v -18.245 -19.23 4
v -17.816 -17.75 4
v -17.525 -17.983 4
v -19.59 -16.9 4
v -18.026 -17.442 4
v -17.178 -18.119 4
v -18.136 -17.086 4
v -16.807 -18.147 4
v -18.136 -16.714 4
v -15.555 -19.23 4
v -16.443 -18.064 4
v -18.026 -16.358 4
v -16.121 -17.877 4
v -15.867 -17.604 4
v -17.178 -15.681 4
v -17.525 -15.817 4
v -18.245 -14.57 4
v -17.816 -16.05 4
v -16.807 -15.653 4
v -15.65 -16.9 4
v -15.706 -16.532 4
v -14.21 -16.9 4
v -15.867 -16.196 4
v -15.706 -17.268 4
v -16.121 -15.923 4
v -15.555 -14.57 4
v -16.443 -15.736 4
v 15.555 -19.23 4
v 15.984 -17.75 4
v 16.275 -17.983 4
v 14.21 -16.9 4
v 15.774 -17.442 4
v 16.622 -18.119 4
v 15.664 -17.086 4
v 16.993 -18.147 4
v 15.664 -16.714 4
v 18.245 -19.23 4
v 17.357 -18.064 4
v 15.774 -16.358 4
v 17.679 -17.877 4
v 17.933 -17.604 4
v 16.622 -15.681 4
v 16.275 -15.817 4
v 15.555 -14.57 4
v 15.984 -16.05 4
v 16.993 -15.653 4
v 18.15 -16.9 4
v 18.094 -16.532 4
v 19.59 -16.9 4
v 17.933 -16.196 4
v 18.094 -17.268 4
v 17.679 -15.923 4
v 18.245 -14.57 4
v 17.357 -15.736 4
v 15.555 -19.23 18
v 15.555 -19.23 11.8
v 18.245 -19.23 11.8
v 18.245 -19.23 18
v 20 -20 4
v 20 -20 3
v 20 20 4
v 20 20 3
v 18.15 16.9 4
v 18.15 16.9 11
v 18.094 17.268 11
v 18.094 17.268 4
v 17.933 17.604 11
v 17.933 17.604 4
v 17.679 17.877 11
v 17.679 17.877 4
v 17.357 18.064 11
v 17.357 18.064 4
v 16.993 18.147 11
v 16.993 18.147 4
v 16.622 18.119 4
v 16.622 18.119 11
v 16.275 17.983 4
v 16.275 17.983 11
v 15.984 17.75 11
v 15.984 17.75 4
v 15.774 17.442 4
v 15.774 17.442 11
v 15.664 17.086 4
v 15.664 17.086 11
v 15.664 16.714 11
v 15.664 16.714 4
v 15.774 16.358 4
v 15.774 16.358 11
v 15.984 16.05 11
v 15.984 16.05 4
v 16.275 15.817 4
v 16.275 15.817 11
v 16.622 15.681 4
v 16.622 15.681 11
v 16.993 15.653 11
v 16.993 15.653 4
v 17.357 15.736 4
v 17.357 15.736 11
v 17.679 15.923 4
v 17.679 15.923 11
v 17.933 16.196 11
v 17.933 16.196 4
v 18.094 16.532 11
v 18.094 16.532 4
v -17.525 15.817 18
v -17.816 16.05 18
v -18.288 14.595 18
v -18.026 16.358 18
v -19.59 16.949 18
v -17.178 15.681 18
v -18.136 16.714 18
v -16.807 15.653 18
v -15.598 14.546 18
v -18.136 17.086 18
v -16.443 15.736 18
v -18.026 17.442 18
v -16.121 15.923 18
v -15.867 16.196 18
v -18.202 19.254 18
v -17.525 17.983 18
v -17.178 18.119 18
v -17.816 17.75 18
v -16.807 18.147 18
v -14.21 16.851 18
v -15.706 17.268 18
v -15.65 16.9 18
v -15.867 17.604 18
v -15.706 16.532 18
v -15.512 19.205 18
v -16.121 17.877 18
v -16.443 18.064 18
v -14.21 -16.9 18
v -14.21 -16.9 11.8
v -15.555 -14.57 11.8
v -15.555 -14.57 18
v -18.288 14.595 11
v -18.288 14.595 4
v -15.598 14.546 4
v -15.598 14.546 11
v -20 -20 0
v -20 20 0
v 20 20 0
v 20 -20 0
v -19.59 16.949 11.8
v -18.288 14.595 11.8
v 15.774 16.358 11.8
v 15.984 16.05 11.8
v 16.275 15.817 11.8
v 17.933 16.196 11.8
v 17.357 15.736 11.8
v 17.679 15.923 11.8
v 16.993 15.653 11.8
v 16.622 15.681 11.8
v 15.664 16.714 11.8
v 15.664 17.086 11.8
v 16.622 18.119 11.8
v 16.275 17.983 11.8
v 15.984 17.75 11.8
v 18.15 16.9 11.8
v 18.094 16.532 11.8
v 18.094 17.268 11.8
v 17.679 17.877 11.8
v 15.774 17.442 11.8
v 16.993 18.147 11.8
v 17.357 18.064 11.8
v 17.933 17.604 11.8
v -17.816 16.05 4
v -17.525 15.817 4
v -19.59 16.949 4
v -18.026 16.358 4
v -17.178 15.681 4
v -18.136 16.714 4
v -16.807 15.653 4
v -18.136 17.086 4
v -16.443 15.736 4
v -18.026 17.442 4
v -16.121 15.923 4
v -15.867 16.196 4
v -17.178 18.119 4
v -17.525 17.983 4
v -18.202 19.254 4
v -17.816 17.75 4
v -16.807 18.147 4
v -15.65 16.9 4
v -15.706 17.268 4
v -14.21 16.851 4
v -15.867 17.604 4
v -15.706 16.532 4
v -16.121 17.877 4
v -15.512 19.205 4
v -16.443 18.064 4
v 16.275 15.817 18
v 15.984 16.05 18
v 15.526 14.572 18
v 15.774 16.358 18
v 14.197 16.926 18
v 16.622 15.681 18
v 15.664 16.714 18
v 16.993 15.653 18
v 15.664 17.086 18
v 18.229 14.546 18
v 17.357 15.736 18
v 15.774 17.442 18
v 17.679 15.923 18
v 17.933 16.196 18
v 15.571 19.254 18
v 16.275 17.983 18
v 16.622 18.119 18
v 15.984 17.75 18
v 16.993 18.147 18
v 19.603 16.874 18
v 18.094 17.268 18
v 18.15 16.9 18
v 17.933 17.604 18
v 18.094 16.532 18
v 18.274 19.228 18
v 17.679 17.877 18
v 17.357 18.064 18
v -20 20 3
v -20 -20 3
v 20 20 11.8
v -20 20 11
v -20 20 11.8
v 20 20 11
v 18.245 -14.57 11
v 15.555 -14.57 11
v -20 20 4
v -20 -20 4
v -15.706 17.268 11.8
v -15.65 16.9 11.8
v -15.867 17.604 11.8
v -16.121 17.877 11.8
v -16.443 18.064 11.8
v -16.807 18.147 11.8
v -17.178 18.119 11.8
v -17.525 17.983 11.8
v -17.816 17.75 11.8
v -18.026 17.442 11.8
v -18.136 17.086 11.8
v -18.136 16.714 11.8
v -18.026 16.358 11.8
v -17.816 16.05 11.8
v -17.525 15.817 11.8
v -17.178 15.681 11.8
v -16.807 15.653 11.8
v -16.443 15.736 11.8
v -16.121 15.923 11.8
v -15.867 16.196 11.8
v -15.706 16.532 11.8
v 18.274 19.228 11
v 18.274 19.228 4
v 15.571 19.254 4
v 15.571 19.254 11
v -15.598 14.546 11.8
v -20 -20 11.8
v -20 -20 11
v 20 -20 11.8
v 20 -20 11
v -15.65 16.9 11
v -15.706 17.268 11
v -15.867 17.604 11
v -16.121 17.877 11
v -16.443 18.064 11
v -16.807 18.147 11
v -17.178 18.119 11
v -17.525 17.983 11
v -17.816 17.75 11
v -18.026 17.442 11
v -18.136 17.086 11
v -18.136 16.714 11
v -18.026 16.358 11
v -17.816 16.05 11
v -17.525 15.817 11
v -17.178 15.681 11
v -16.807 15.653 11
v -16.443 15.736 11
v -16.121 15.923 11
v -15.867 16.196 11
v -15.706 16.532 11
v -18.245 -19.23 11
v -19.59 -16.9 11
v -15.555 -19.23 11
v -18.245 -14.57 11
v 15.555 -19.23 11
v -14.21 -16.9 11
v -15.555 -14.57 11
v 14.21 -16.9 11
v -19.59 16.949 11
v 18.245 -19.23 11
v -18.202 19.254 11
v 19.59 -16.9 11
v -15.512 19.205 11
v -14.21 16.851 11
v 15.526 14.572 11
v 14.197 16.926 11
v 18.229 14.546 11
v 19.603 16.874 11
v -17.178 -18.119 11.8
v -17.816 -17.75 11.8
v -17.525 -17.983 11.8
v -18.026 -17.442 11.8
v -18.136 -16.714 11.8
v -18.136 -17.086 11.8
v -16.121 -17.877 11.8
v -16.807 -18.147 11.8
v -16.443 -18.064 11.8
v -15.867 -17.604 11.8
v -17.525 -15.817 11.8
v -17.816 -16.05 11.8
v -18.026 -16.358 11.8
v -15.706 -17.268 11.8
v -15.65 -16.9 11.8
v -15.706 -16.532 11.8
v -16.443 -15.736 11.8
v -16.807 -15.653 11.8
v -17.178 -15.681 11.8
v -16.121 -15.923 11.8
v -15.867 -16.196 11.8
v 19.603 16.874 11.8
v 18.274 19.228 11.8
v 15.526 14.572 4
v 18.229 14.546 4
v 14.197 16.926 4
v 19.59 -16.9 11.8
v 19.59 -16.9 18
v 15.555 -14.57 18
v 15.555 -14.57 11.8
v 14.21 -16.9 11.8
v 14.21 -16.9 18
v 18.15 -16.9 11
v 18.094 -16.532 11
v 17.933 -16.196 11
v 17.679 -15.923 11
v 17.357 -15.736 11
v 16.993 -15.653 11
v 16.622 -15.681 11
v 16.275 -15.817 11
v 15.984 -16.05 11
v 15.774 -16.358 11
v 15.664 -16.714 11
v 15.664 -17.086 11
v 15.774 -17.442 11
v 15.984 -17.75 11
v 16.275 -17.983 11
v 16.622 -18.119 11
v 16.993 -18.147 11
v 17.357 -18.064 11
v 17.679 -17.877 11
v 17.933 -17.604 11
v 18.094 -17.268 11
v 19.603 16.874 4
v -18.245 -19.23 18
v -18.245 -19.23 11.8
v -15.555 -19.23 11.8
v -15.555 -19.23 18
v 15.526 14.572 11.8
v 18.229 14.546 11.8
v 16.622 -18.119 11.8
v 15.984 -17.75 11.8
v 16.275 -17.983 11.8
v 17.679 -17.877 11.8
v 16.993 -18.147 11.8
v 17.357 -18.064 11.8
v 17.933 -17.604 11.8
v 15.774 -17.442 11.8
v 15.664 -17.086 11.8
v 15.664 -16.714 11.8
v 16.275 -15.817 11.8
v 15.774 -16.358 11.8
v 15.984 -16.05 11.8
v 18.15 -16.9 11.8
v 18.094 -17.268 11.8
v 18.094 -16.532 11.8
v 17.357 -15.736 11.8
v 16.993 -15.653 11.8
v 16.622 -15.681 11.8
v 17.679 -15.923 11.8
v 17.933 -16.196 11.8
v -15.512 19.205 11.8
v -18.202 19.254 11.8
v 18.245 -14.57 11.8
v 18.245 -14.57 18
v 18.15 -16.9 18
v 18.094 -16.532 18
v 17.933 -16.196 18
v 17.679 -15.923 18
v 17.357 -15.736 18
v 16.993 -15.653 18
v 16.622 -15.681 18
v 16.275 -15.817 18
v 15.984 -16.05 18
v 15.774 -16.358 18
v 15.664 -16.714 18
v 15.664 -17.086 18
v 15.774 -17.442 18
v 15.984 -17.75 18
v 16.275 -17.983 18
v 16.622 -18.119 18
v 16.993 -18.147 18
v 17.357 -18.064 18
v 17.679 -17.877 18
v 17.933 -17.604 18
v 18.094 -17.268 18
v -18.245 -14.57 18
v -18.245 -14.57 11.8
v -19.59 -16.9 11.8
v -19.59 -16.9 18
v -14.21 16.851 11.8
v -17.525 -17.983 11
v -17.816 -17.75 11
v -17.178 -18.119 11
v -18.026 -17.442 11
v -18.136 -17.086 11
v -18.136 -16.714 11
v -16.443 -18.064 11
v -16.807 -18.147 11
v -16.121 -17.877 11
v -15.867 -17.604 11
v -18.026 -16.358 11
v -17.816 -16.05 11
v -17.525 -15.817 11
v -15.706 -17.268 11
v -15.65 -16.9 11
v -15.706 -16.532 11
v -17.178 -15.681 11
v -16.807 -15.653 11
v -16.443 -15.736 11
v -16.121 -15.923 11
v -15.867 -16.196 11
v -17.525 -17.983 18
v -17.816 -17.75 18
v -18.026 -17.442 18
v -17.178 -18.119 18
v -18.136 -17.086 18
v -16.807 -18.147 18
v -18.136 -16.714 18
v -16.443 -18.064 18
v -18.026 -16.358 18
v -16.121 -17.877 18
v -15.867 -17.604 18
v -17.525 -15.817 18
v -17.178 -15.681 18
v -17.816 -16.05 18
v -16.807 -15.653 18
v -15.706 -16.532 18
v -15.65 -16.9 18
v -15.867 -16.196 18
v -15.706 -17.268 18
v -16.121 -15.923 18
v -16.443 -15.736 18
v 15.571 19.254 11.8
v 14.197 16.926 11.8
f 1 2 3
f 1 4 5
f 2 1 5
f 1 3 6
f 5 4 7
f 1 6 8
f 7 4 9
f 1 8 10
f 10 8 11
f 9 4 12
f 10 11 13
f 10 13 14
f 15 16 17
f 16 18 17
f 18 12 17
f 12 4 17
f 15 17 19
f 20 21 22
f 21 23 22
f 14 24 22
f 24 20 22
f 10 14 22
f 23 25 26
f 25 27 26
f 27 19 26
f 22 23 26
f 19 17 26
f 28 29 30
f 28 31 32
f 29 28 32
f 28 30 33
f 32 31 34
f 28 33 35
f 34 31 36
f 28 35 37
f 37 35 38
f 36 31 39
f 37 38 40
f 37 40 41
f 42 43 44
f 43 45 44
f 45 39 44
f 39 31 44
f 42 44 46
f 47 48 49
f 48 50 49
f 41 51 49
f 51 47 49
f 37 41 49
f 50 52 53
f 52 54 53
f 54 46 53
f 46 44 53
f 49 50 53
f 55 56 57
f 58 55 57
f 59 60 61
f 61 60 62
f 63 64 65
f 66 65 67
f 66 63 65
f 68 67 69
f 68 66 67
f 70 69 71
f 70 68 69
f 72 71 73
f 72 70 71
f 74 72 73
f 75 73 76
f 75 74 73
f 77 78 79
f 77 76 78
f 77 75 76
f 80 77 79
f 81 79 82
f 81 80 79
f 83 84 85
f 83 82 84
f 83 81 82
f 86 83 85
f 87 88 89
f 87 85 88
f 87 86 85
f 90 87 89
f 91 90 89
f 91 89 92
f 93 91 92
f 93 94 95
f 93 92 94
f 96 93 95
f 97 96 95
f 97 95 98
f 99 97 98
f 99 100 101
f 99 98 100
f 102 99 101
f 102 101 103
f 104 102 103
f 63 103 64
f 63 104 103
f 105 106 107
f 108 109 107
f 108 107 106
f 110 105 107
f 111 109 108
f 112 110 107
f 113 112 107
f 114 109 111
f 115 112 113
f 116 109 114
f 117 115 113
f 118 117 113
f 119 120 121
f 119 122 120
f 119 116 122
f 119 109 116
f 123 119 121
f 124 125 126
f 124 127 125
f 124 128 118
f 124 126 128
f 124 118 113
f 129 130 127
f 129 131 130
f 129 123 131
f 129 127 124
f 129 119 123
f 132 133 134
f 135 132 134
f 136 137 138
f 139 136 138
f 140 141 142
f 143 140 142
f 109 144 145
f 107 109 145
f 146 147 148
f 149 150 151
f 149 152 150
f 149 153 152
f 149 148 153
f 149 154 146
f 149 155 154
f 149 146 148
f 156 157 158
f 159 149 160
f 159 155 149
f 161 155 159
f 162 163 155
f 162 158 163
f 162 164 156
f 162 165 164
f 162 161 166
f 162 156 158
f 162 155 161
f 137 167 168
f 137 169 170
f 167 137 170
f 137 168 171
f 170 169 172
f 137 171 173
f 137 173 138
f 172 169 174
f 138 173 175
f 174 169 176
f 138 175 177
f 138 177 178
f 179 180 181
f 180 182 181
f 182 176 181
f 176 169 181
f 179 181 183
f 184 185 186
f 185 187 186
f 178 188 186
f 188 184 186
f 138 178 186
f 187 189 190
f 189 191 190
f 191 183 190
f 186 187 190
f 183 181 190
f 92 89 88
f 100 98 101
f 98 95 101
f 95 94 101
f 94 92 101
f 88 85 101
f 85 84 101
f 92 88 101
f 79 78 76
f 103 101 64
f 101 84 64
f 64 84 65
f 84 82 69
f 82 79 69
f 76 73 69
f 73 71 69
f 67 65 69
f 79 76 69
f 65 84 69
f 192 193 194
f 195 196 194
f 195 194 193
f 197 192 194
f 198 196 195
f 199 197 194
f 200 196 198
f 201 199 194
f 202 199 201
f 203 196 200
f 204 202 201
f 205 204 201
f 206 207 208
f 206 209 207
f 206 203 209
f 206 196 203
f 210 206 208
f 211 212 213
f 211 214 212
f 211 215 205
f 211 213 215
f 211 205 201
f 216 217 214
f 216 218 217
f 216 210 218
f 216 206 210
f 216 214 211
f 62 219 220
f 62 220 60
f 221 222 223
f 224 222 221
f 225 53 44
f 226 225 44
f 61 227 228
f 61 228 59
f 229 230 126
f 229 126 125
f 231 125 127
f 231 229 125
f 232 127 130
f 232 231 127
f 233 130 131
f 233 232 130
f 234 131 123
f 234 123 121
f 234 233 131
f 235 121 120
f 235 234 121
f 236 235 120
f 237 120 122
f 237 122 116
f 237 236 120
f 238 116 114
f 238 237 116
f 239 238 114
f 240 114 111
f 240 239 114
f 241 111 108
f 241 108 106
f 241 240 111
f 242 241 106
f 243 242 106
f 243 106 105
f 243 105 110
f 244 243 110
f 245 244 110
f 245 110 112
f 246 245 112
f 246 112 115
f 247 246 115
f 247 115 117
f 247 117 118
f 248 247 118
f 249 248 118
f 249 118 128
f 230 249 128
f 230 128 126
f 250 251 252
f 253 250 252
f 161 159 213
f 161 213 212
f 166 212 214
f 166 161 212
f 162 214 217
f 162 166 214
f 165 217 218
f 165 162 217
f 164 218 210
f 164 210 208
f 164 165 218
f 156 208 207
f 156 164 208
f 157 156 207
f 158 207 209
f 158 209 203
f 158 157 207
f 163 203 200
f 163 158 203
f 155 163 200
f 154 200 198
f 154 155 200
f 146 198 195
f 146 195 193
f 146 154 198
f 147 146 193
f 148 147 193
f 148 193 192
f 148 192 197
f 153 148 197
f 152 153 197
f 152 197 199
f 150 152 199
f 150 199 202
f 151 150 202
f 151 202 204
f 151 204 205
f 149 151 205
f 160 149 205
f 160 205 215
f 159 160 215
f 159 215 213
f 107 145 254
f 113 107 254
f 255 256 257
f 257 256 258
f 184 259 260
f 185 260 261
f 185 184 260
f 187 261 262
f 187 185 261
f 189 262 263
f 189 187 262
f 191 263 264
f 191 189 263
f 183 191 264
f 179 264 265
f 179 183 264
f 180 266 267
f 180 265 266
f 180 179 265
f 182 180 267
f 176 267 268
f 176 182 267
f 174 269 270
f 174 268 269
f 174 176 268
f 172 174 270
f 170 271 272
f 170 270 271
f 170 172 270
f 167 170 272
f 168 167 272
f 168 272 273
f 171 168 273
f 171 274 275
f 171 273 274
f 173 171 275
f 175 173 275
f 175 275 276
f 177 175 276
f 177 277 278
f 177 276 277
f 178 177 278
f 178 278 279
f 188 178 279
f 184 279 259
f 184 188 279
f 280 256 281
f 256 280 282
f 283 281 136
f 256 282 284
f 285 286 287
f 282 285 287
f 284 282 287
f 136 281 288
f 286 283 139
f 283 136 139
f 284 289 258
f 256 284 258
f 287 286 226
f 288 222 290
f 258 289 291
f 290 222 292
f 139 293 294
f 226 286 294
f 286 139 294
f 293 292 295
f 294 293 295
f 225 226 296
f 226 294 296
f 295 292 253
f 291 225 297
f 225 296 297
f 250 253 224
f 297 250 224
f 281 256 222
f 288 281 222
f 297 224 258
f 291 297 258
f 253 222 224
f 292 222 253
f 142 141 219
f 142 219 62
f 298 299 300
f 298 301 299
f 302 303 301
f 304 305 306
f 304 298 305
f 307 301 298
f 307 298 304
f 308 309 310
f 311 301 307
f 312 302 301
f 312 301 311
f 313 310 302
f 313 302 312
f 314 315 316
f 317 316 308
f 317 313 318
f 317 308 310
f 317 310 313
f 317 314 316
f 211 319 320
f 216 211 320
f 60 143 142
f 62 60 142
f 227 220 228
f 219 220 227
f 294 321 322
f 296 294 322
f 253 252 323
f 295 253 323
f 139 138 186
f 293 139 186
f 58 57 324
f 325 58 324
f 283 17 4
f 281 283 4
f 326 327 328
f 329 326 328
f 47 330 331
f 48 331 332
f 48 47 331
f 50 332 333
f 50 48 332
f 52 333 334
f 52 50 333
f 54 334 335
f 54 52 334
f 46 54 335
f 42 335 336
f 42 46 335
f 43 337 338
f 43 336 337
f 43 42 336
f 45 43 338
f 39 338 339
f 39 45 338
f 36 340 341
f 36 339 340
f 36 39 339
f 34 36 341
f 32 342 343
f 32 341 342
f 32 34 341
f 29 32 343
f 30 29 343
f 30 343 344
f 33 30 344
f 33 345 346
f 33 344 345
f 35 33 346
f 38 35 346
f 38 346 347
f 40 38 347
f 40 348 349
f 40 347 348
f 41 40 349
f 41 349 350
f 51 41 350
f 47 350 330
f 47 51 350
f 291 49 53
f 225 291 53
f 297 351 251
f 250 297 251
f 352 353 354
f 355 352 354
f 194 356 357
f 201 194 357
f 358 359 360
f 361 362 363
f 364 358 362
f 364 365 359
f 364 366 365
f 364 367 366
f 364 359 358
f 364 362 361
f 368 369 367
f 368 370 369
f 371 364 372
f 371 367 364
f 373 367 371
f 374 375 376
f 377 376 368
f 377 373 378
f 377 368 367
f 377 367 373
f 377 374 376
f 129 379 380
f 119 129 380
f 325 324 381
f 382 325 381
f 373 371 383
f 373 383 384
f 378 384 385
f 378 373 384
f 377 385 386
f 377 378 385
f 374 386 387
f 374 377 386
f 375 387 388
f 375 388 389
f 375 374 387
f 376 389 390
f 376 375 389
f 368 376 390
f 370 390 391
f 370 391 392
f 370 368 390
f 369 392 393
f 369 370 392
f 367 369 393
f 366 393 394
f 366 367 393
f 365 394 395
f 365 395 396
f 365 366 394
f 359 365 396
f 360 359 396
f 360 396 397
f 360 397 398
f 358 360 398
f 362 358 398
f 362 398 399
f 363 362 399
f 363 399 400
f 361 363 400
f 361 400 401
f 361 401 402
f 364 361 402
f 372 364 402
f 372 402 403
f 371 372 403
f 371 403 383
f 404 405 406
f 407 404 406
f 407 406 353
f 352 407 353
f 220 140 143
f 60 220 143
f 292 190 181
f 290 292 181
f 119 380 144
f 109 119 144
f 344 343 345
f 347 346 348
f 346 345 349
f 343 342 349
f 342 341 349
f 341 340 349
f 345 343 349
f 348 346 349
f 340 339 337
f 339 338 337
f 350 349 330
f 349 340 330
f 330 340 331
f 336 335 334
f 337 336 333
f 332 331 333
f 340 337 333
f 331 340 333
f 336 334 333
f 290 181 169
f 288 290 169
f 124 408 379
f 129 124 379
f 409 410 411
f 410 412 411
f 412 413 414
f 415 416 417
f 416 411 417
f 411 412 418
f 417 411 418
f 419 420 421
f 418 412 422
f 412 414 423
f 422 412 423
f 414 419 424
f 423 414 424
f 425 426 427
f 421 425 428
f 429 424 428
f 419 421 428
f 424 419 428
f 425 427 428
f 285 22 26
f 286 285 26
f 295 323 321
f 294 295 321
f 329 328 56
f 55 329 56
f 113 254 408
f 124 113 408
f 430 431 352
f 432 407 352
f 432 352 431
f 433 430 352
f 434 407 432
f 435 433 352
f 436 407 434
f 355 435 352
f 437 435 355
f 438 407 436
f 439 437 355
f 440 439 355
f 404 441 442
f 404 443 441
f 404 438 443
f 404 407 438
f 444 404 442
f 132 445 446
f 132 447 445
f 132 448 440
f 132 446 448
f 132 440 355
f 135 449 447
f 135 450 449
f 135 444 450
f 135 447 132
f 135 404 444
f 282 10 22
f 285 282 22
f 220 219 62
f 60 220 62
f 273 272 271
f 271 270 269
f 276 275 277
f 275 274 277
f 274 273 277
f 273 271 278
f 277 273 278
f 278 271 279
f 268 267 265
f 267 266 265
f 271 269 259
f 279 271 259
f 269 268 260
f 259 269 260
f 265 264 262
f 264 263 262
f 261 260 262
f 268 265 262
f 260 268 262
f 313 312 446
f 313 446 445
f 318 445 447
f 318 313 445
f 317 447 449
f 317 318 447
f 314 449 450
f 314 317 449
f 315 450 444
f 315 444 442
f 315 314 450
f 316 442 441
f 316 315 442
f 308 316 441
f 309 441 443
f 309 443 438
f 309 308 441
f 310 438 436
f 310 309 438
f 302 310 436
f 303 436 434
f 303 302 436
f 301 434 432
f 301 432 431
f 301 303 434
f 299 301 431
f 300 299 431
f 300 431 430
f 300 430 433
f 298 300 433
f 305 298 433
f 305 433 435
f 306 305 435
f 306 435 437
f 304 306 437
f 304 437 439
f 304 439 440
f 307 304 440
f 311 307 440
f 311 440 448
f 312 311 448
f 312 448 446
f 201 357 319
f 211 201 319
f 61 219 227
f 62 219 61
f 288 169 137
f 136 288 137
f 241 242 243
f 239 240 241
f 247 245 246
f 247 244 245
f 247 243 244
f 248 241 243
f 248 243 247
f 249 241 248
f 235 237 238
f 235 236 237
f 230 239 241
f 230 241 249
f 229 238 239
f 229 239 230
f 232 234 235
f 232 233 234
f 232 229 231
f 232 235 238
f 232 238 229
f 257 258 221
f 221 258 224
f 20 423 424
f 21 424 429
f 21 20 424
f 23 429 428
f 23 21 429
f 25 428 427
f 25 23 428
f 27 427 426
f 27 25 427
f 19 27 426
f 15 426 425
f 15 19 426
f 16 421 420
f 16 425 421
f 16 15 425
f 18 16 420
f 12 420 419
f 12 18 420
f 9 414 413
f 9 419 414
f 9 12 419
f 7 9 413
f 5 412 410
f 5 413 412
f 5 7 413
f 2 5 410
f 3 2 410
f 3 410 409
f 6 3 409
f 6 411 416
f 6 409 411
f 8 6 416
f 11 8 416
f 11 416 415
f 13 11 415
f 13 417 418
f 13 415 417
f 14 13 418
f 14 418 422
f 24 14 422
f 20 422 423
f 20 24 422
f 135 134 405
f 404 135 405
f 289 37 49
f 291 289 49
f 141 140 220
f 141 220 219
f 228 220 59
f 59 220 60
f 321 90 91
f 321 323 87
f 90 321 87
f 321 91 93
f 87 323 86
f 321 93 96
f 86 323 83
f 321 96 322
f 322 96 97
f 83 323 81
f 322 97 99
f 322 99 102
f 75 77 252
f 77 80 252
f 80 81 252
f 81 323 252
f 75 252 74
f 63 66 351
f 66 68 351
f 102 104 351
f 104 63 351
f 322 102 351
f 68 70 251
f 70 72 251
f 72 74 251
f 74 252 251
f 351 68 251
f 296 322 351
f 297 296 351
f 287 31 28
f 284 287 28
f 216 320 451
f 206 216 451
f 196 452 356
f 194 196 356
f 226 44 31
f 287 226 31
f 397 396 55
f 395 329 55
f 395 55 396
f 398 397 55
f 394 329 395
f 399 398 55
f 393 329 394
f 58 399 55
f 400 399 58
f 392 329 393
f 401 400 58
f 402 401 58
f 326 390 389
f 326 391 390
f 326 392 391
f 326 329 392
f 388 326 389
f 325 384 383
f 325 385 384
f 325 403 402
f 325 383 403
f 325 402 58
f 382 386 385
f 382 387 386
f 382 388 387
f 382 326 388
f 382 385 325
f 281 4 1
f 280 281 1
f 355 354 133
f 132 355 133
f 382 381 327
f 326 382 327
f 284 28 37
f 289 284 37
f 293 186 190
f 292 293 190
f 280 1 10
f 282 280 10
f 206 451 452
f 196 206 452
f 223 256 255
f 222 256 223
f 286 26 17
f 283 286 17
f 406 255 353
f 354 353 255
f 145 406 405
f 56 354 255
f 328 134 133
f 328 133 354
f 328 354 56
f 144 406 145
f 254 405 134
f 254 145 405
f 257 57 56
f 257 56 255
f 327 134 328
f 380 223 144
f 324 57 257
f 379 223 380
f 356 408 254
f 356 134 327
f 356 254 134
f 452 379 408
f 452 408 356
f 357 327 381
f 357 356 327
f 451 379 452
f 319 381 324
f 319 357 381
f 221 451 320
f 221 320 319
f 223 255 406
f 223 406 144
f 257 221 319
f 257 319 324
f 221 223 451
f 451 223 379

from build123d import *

# Parameters (mm, degrees)
SKETCH1_W             = 40
SKETCH1_H             = 40
BOSS_EXTRUDE1_DEPTH   = 3
SKETCH2_W             = 40
SKETCH2_H             = 40
BOSS_EXTRUDE2_DEPTH   = 1
SKETCH3_R             = 1.25
BOSS_EXTRUDE3_DEPTH   = 14
BOSS_EXTRUDE3_2_DEPTH = 14
BOSS_EXTRUDE3_3_DEPTH = 14
BOSS_EXTRUDE3_4_DEPTH = 14
SKETCH4_W             = 40
SKETCH4_H             = 40
BOSS_EXTRUDE4_DEPTH   = 0.8


with BuildPart() as part:
    # Sketch1 → Boss-Extrude1 (new body)
    with BuildSketch(Plane.XY):
        Rectangle(SKETCH1_W, SKETCH1_H)
    extrude(amount=BOSS_EXTRUDE1_DEPTH)


with BuildPart() as body_2:
    # Sketch2 → Boss-Extrude2 (new body)
    with BuildSketch(Plane.XY.offset(3)):
        Rectangle(SKETCH2_W, SKETCH2_H)
    extrude(amount=BOSS_EXTRUDE2_DEPTH)


with BuildPart() as body_3:
    # Sketch3 → Boss-Extrude3 (new body)
    with BuildSketch(Plane.XY.offset(4)):
        Polygon((-15.59757022, 14.545810118), (-14.209996867, 16.850842335), (-15.512426647, 19.205032217), (-18.20242978, 19.254189882), (-19.590003133, 16.949157665), (-18.287573353, 14.594967783), align=None)
        with Locations((-16.9, 16.9)):
            Circle(SKETCH3_R, mode=Mode.SUBTRACT)
    extrude(amount=BOSS_EXTRUDE3_DEPTH)



with BuildPart() as body_4:
    # Sketch3 → Boss-Extrude3 2 (new body)
    with BuildSketch(Plane.XY.offset(4)):
        Polygon((18.228941115, 14.545810118), (19.603258801, 16.873801825), (18.274317686, 19.227991707), (15.571058885, 19.254189882), (14.196741199, 16.926198175), (15.525682314, 14.572008293), align=None)
        with Locations((16.9, 16.9)):
            Circle(SKETCH3_R, mode=Mode.SUBTRACT)
    extrude(amount=BOSS_EXTRUDE3_2_DEPTH)


with BuildPart() as body_5:
    # Sketch3 → Boss-Extrude3 3 (new body)
    with BuildSketch(Plane.XY.offset(4)):
        Polygon((19.590452254, -16.9), (18.245226127, -14.57), (15.554773873, -14.57), (14.209547746, -16.9), (15.554773873, -19.23), (18.245226127, -19.23), align=None)
        with Locations((16.9, -16.9)):
            Circle(SKETCH3_R, mode=Mode.SUBTRACT)
    extrude(amount=BOSS_EXTRUDE3_3_DEPTH)


with BuildPart() as body_6:
    # Sketch3 → Boss-Extrude3 4 (new body)
    with BuildSketch(Plane.XY.offset(4)):
        Polygon((-14.209547746, -16.9), (-15.554773873, -14.57), (-18.245226127, -14.57), (-19.590452254, -16.9), (-18.245226127, -19.23), (-15.554773873, -19.23), align=None)
        with Locations((-16.9, -16.9)):
            Circle(SKETCH3_R, mode=Mode.SUBTRACT)
    extrude(amount=BOSS_EXTRUDE3_4_DEPTH)


with BuildPart() as body_3_1:
    add(body_3.part)

    add(body_4.part)  # Boss-Extrude4 merges body 4

    add(body_5.part)  # Boss-Extrude4 merges body 5

    add(body_6.part)  # Boss-Extrude4 merges body 6
    # Sketch4 → Boss-Extrude4 (add)
    with BuildSketch(Plane.XY.offset(11)):
        Rectangle(SKETCH4_W, SKETCH4_H)
    extrude(amount=BOSS_EXTRUDE4_DEPTH)


solid = Compound([part.part, body_2.part, body_3_1.part])
